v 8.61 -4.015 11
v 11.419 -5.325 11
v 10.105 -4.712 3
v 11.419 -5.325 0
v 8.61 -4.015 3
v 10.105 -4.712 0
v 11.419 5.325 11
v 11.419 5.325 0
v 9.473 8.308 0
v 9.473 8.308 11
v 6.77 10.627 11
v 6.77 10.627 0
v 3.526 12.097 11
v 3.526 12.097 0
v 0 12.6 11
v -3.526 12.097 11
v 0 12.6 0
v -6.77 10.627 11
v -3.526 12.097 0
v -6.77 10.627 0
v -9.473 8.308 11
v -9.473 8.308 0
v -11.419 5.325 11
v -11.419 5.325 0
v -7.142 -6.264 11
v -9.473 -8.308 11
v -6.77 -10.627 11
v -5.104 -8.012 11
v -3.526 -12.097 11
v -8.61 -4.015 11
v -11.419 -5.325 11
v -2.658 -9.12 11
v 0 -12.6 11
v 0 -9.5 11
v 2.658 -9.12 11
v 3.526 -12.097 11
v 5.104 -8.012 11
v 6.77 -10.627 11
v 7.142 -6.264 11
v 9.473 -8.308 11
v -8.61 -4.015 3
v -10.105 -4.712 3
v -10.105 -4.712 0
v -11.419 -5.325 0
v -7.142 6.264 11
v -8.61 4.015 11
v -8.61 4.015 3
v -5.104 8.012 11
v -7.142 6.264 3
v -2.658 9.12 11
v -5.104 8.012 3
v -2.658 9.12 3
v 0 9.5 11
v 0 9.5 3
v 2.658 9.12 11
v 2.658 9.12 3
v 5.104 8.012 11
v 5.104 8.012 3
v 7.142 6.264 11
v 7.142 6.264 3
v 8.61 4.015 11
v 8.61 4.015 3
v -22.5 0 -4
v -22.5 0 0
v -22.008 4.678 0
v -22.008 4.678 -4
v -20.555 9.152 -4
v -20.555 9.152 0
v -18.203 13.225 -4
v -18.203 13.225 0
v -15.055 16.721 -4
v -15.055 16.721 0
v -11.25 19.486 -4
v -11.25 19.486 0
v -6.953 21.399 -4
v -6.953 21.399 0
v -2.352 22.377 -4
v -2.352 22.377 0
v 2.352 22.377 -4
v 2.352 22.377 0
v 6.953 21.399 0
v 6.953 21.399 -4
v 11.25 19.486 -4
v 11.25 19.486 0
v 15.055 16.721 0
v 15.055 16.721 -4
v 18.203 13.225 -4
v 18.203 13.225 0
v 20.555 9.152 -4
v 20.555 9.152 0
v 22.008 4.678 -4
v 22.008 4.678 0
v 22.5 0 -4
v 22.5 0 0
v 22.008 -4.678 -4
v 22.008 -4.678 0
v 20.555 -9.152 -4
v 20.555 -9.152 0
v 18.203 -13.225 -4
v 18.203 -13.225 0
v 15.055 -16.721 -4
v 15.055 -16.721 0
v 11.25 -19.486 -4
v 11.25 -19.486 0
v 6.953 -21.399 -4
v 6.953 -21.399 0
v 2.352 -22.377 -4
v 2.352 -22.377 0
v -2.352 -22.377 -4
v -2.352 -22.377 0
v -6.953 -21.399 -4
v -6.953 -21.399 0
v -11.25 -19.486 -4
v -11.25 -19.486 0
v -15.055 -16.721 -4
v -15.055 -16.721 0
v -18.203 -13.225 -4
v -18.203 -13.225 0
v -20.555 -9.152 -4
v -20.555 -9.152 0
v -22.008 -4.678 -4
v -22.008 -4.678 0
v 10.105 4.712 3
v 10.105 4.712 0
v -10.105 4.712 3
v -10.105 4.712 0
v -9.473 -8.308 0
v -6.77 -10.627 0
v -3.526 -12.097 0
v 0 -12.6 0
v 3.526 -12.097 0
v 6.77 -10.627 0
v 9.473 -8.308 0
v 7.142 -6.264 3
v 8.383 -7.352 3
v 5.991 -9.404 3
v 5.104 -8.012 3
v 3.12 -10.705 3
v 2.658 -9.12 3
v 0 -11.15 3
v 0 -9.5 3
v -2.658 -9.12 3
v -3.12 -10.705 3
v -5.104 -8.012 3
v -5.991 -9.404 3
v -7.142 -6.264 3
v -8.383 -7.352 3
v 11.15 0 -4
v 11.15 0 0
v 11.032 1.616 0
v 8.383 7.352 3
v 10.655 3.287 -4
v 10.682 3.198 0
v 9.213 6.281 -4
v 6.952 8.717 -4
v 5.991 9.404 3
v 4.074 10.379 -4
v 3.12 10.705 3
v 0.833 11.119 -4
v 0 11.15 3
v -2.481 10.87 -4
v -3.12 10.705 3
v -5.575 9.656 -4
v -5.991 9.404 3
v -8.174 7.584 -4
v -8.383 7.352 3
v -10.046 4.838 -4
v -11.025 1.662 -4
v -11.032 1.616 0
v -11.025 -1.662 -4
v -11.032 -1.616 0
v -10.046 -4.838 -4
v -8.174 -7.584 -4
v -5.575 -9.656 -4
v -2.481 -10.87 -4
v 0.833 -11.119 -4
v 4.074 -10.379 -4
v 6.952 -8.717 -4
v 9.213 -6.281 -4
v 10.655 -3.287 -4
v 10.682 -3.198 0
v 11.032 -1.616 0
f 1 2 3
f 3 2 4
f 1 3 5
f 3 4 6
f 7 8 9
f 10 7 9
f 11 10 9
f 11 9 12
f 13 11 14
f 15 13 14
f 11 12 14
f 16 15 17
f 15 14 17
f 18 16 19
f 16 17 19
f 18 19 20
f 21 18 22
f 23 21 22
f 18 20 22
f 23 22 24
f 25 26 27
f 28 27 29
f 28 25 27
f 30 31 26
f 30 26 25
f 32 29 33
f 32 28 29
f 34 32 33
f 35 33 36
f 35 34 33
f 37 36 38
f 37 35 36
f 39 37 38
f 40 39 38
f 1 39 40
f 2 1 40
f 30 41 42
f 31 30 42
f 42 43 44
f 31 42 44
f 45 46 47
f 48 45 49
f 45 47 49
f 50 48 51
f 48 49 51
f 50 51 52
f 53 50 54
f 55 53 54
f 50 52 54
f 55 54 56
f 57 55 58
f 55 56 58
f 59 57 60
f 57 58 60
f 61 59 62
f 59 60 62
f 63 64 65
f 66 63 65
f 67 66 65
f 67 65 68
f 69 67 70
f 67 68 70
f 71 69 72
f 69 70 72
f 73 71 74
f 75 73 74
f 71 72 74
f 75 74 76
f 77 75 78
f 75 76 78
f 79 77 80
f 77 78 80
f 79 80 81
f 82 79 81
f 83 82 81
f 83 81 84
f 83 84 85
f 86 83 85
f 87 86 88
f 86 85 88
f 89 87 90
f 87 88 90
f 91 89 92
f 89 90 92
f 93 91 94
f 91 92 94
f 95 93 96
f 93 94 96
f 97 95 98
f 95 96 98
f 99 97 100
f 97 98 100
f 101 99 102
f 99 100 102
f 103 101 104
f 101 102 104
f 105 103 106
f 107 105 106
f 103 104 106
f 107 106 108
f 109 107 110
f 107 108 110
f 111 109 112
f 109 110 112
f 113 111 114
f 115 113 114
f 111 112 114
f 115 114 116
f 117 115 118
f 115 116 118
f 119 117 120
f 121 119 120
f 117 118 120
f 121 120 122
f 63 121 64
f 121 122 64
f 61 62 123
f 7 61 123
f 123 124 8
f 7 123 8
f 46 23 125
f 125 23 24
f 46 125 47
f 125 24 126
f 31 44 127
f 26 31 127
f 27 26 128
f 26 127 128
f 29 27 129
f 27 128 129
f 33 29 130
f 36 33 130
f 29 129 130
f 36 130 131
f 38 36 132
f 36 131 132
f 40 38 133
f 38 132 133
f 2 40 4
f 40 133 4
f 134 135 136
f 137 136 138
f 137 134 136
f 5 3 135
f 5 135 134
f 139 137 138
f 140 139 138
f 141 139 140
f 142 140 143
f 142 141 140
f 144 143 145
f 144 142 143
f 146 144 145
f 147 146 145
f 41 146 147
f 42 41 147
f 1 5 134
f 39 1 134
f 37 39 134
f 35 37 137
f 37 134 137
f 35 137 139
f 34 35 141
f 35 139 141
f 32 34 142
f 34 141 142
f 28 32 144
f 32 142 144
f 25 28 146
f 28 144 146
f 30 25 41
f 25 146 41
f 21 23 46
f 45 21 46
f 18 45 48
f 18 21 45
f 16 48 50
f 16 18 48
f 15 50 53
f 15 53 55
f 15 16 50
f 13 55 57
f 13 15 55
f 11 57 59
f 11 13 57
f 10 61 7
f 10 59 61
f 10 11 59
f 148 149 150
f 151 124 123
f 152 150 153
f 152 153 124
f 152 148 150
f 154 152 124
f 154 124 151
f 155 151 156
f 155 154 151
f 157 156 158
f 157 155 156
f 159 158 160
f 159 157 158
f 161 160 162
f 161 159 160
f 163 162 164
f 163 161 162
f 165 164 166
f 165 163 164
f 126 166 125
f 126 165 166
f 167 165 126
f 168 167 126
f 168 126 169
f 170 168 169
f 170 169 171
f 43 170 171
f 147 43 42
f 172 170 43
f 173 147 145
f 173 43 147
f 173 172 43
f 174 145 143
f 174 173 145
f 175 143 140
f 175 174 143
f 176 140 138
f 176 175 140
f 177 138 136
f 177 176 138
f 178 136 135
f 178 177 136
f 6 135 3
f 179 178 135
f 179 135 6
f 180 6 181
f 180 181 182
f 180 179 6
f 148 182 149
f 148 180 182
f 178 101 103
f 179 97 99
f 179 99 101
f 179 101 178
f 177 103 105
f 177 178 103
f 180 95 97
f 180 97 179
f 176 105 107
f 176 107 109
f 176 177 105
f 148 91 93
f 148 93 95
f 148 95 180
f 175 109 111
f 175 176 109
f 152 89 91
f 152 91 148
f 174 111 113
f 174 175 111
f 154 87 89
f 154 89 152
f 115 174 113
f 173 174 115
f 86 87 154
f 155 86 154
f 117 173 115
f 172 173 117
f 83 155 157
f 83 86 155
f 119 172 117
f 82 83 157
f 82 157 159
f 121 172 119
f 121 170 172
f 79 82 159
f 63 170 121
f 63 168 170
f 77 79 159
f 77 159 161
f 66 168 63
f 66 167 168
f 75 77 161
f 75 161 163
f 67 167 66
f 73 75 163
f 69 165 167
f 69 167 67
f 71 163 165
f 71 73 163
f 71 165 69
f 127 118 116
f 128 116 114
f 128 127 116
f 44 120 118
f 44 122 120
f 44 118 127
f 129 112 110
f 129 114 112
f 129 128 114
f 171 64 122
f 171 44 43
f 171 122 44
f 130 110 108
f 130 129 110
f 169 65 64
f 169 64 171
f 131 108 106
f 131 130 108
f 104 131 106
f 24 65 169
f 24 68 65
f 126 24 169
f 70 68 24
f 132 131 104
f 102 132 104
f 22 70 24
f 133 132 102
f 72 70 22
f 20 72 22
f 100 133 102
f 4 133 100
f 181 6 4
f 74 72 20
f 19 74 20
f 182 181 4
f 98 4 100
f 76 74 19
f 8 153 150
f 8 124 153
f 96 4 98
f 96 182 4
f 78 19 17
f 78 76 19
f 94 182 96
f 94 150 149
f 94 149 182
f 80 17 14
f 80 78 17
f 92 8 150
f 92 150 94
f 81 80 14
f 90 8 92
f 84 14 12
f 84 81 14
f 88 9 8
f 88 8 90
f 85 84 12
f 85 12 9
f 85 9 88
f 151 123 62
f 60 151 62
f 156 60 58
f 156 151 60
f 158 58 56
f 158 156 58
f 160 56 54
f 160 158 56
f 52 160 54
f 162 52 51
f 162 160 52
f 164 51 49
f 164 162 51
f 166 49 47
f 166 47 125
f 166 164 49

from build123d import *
from build123d.topology import SkipClean

# Parameters (mm, degrees)
ESBO_O1_R                = 11.15
RESSALTO_EXTRUS_O1_DEPTH = 15
ESBO_O2_R                = 22.5
RESSALTO_EXTRUS_O2_DEPTH = 4
RESSALTO_EXTRUS_O6_START = -8
ESBO_O5_R                = 11.15
ESBO_O5_R_2              = 8
RESSALTO_EXTRUS_O6_DEPTH = 8
RESSALTO_EXTRUS_O7_START = 4
ESBO_O7_R                = 14.2
ESBO_O7_R_2              = 11.15
RESSALTO_EXTRUS_O7_DEPTH = 4
RESSALTO_EXTRUS_O8_START = 4
ESBO_O8_R                = 11.15
ESBO_O8_R_2              = 8
RESSALTO_EXTRUS_O8_DEPTH = 4
RESSALTO_EXTRUS_O9_DEPTH = 7
CORTE_EXTRUS_O2_START    = -15
CORTE_EXTRUS_O2_DEPTH    = 15
CORTE_EXTRUS_O3_START    = -11
CORTE_EXTRUS_O3_DEPTH    = 11


with BuildPart() as part:
    # Esboço1 → Ressalto-extrusão1 (new body)
    with BuildSketch(Plane.XY):
        with BuildLine():
            Line((-2.5, 18), (-2.5, 13.978197309))
            ThreePointArc((-2.5, 13.978197309), (-10.040916293, 10.040916293), (-13.978197309, 2.5))
            Line((-13.978197309, 2.5), (-18, 2.5))
            Line((-18, 2.5), (-18, -2.5))
            Line((-18, -2.5), (-13.978197309, -2.5))
            ThreePointArc((-13.978197309, -2.5), (-10.040916293, -10.040916293), (-2.5, -13.978197309))
            Line((-2.5, -13.978197309), (-2.5, -18))
            Line((-2.5, -18), (2.5, -18))
            Line((2.5, -18), (2.5, -13.978197309))
            ThreePointArc((2.5, -13.978197309), (10.040916293, -10.040916293), (13.978197309, -2.5))
            Line((13.978197309, -2.5), (18, -2.5))
            Line((18, -2.5), (18, 2.5))
            Line((18, 2.5), (13.978197309, 2.5))
            ThreePointArc((13.978197309, 2.5), (10.040916293, 10.040916293), (2.5, 13.978197309))
            Line((2.5, 13.978197309), (2.5, 18))
            Line((2.5, 18), (-2.5, 18))
        make_face()
        Circle(ESBO_O1_R, mode=Mode.SUBTRACT)
    extrude(amount=RESSALTO_EXTRUS_O1_DEPTH)

    # Esboço5 → Ressalto-extrusão6 (add)
    with BuildSketch(Plane.XY.offset(15).offset(RESSALTO_EXTRUS_O6_START)):
        Circle(ESBO_O5_R)
        Circle(ESBO_O5_R_2, mode=Mode.SUBTRACT)
    extrude(amount=RESSALTO_EXTRUS_O6_DEPTH)



with BuildPart() as body_2:
    # Esboço2 → Ressalto-extrusão2 (new body)
    # profile 1 of 5: a face of its own
    with SkipClean():  # the faces are left unmerged after this step: merging them gives an invalid solid
        with BuildSketch(Plane(origin=(0, 0, 0), x_dir=(-1, 0, 0), z_dir=(0, 0, -1))):
            Circle(ESBO_O2_R)
            with BuildLine():
                Line((2.5, 13.978197309), (2.5, 18))
                Line((2.5, 18), (-2.5, 18))
                Line((-2.5, 18), (-2.5, 13.978197309))
                ThreePointArc((-2.5, 13.978197309), (-10.040916293, 10.040916293), (-13.978197309, 2.5))
                Line((-13.978197309, 2.5), (-18, 2.5))
                Line((-18, 2.5), (-18, -2.5))
                Line((-18, -2.5), (-13.978197309, -2.5))
                ThreePointArc((-13.978197309, -2.5), (-10.040916293, -10.040916293), (-2.5, -13.978197309))
                Line((-2.5, -13.978197309), (-2.5, -18))
                Line((-2.5, -18), (2.5, -18))
                Line((2.5, -18), (2.5, -13.978197309))
                ThreePointArc((2.5, -13.978197309), (10.040916293, -10.040916293), (13.978197309, -2.5))
                Line((13.978197309, -2.5), (18, -2.5))
                Line((18, -2.5), (18, 2.5))
                Line((18, 2.5), (13.978197309, 2.5))
                ThreePointArc((13.978197309, 2.5), (10.040916293, 10.040916293), (2.5, 13.978197309))
            make_face(mode=Mode.SUBTRACT)
        # profile 2 of 5: a face of its own
        with BuildSketch(Plane(origin=(0, 0, 0), x_dir=(-1, 0, 0), z_dir=(0, 0, -1))):
            with BuildLine():
                Line((2.5, -18), (2.5, -13.978197309))
                ThreePointArc((2.5, -13.978197309), (0, -14.2), (-2.5, -13.978197309))
                Line((-2.5, -13.978197309), (-2.5, -18))
                Line((-2.5, -18), (2.5, -18))
            make_face()
        # profile 3 of 5: a face of its own
        with BuildSketch(Plane(origin=(0, 0, 0), x_dir=(-1, 0, 0), z_dir=(0, 0, -1))):
            with BuildLine():
                ThreePointArc((-13.978197309, -2.5), (-14.2, 0), (-13.978197309, 2.5))
                Line((-13.978197309, 2.5), (-18, 2.5))
                Line((-18, 2.5), (-18, -2.5))
                Line((-18, -2.5), (-13.978197309, -2.5))
            make_face()
        # profile 4 of 5: a face of its own
        with BuildSketch(Plane(origin=(0, 0, 0), x_dir=(-1, 0, 0), z_dir=(0, 0, -1))):
            with BuildLine():
                ThreePointArc((-2.5, 13.978197309), (0, 14.2), (2.5, 13.978197309))
                Line((2.5, 13.978197309), (2.5, 18))
                Line((2.5, 18), (-2.5, 18))
                Line((-2.5, 18), (-2.5, 13.978197309))
            make_face()
        # profile 5 of 5: a face of its own
        with BuildSketch(Plane(origin=(0, 0, 0), x_dir=(-1, 0, 0), z_dir=(0, 0, -1))):
            with BuildLine():
                Line((18, 2.5), (13.978197309, 2.5))
                ThreePointArc((13.978197309, 2.5), (14.2, 0), (13.978197309, -2.5))
                Line((13.978197309, -2.5), (18, -2.5))
                Line((18, -2.5), (18, 2.5))
            make_face()
        extrude(amount=RESSALTO_EXTRUS_O2_DEPTH)


with BuildPart() as part_1:
    with SkipClean():  # the faces are left unmerged after this step: merging them gives an invalid solid
        add(part.part)

        add(body_2.part)  # Ressalto-extrusão7 merges body 2
        # Esboço7 → Ressalto-extrusão7 (add)
        with BuildSketch(Plane(origin=(0, 0, 0), x_dir=(-1, 0, 0), z_dir=(0, 0, -1)).offset(RESSALTO_EXTRUS_O7_START)):
            Circle(ESBO_O7_R)
            with Locations(Location((0, 0, 0), (0, 0, 180))):
                Circle(ESBO_O7_R_2, mode=Mode.SUBTRACT)
        extrude(amount=-RESSALTO_EXTRUS_O7_DEPTH)

    # Esboço8 → Ressalto-extrusão8 (add)
    with BuildSketch(Plane(origin=(0, 0, 7), x_dir=(-1, 0, 0), z_dir=(0, 0, -1)).offset(RESSALTO_EXTRUS_O8_START)):
        Circle(ESBO_O8_R)
        with Locations(Location((0, 0, 0), (0, 0, 180))):
            Circle(ESBO_O8_R_2, mode=Mode.SUBTRACT)
    extrude(amount=-RESSALTO_EXTRUS_O8_DEPTH)

    # Esboço9 → Ressalto-extrusão9 (add)
    with BuildSketch(Plane.XY.offset(15)):
        with BuildLine():
            Line((-11.419478117, 5.324990098), (-8.609923977, 4.014873487))
            ThreePointArc((-8.609923977, 4.014873487), (0, 9.5), (8.609923977, 4.014873487))
            Line((8.609923977, 4.014873487), (11.419478117, 5.324990098))
            ThreePointArc((11.419478117, 5.324990098), (0, 12.6), (-11.419478117, 5.324990098))
        make_face()
        with BuildLine():
            Line((-11.419478117, -5.324990098), (-8.609923977, -4.014873487))
            ThreePointArc((-8.609923977, -4.014873487), (0, -9.5), (8.609923977, -4.014873487))
            Line((8.609923977, -4.014873487), (11.419478117, -5.324990098))
            ThreePointArc((11.419478117, -5.324990098), (0, -12.6), (-11.419478117, -5.324990098))
        make_face()
    extrude(amount=RESSALTO_EXTRUS_O9_DEPTH)

    # Esboço10 → Corte-extrusão2 (cut)
    with BuildSketch(Plane.XY.offset(15).offset(CORTE_EXTRUS_O2_START)):
        with BuildLine():
            Line((-2.5, 18), (-2.5, 13.978197309))
            ThreePointArc((-2.5, 13.978197309), (-10.040916293, 10.040916293), (-13.978197309, 2.5))
            Line((-13.978197309, 2.5), (-18, 2.5))
            Line((-18, 2.5), (-18, -2.5))
            Line((-18, -2.5), (-13.978197309, -2.5))
            ThreePointArc((-13.978197309, -2.5), (-10.040916293, -10.040916293), (-2.5, -13.978197309))
            Line((-2.5, -13.978197309), (-2.5, -18))
            Line((-2.5, -18), (2.5, -18))
            Line((2.5, -18), (2.5, -13.978197309))
            ThreePointArc((2.5, -13.978197309), (10.040916293, -10.040916293), (13.978197309, -2.5))
            Line((13.978197309, -2.5), (18, -2.5))
            Line((18, -2.5), (18, 2.5))
            Line((18, 2.5), (13.978197309, 2.5))
            ThreePointArc((13.978197309, 2.5), (10.040916293, 10.040916293), (2.5, 13.978197309))
            Line((2.5, 13.978197309), (2.5, 18))
            Line((2.5, 18), (-2.5, 18))
        make_face()
        with BuildLine():
            Line((11.419478117, -5.324990098), (8.609923977, -4.014873487))
            ThreePointArc((8.609923977, -4.014873487), (0, -9.5), (-8.609923977, -4.014873487))
            Line((-8.609923977, -4.014873487), (-11.419478117, -5.324990098))
            ThreePointArc((-11.419478117, -5.324990098), (0, -12.6), (11.419478117, -5.324990098))
        make_face(mode=Mode.SUBTRACT)
        with BuildLine():
            Line((8.609923977, 4.014873487), (11.419478117, 5.324990098))
            ThreePointArc((11.419478117, 5.324990098), (0, 12.6), (-11.419478117, 5.324990098))
            Line((-11.419478117, 5.324990098), (-8.609923977, 4.014873487))
            ThreePointArc((-8.609923977, 4.014873487), (0, 9.5), (8.609923977, 4.014873487))
        make_face(mode=Mode.SUBTRACT)
    extrude(amount=CORTE_EXTRUS_O2_DEPTH, mode=Mode.SUBTRACT)

    # Esboço11 → Corte-extrusão3 (cut)
    with BuildSketch(Plane.XY.offset(22).offset(CORTE_EXTRUS_O3_START)):
        with BuildLine():
            Line((11.419478117, -5.324990098), (8.609923977, -4.014873487))
            ThreePointArc((8.609923977, -4.014873487), (0, -9.5), (-8.609923977, -4.014873487))
            Line((-8.609923977, -4.014873487), (-11.419478117, -5.324990098))
            ThreePointArc((-11.419478117, -5.324990098), (0, -12.6), (11.419478117, -5.324990098))
        make_face()
        with BuildLine():
            Line((8.609923977, 4.014873487), (11.419478117, 5.324990098))
            ThreePointArc((11.419478117, 5.324990098), (0, 12.6), (-11.419478117, 5.324990098))
            Line((-11.419478117, 5.324990098), (-8.609923977, 4.014873487))
            ThreePointArc((-8.609923977, 4.014873487), (0, 9.5), (8.609923977, 4.014873487))
        make_face()
    extrude(amount=CORTE_EXTRUS_O3_DEPTH, mode=Mode.SUBTRACT)


solid = part_1.part
